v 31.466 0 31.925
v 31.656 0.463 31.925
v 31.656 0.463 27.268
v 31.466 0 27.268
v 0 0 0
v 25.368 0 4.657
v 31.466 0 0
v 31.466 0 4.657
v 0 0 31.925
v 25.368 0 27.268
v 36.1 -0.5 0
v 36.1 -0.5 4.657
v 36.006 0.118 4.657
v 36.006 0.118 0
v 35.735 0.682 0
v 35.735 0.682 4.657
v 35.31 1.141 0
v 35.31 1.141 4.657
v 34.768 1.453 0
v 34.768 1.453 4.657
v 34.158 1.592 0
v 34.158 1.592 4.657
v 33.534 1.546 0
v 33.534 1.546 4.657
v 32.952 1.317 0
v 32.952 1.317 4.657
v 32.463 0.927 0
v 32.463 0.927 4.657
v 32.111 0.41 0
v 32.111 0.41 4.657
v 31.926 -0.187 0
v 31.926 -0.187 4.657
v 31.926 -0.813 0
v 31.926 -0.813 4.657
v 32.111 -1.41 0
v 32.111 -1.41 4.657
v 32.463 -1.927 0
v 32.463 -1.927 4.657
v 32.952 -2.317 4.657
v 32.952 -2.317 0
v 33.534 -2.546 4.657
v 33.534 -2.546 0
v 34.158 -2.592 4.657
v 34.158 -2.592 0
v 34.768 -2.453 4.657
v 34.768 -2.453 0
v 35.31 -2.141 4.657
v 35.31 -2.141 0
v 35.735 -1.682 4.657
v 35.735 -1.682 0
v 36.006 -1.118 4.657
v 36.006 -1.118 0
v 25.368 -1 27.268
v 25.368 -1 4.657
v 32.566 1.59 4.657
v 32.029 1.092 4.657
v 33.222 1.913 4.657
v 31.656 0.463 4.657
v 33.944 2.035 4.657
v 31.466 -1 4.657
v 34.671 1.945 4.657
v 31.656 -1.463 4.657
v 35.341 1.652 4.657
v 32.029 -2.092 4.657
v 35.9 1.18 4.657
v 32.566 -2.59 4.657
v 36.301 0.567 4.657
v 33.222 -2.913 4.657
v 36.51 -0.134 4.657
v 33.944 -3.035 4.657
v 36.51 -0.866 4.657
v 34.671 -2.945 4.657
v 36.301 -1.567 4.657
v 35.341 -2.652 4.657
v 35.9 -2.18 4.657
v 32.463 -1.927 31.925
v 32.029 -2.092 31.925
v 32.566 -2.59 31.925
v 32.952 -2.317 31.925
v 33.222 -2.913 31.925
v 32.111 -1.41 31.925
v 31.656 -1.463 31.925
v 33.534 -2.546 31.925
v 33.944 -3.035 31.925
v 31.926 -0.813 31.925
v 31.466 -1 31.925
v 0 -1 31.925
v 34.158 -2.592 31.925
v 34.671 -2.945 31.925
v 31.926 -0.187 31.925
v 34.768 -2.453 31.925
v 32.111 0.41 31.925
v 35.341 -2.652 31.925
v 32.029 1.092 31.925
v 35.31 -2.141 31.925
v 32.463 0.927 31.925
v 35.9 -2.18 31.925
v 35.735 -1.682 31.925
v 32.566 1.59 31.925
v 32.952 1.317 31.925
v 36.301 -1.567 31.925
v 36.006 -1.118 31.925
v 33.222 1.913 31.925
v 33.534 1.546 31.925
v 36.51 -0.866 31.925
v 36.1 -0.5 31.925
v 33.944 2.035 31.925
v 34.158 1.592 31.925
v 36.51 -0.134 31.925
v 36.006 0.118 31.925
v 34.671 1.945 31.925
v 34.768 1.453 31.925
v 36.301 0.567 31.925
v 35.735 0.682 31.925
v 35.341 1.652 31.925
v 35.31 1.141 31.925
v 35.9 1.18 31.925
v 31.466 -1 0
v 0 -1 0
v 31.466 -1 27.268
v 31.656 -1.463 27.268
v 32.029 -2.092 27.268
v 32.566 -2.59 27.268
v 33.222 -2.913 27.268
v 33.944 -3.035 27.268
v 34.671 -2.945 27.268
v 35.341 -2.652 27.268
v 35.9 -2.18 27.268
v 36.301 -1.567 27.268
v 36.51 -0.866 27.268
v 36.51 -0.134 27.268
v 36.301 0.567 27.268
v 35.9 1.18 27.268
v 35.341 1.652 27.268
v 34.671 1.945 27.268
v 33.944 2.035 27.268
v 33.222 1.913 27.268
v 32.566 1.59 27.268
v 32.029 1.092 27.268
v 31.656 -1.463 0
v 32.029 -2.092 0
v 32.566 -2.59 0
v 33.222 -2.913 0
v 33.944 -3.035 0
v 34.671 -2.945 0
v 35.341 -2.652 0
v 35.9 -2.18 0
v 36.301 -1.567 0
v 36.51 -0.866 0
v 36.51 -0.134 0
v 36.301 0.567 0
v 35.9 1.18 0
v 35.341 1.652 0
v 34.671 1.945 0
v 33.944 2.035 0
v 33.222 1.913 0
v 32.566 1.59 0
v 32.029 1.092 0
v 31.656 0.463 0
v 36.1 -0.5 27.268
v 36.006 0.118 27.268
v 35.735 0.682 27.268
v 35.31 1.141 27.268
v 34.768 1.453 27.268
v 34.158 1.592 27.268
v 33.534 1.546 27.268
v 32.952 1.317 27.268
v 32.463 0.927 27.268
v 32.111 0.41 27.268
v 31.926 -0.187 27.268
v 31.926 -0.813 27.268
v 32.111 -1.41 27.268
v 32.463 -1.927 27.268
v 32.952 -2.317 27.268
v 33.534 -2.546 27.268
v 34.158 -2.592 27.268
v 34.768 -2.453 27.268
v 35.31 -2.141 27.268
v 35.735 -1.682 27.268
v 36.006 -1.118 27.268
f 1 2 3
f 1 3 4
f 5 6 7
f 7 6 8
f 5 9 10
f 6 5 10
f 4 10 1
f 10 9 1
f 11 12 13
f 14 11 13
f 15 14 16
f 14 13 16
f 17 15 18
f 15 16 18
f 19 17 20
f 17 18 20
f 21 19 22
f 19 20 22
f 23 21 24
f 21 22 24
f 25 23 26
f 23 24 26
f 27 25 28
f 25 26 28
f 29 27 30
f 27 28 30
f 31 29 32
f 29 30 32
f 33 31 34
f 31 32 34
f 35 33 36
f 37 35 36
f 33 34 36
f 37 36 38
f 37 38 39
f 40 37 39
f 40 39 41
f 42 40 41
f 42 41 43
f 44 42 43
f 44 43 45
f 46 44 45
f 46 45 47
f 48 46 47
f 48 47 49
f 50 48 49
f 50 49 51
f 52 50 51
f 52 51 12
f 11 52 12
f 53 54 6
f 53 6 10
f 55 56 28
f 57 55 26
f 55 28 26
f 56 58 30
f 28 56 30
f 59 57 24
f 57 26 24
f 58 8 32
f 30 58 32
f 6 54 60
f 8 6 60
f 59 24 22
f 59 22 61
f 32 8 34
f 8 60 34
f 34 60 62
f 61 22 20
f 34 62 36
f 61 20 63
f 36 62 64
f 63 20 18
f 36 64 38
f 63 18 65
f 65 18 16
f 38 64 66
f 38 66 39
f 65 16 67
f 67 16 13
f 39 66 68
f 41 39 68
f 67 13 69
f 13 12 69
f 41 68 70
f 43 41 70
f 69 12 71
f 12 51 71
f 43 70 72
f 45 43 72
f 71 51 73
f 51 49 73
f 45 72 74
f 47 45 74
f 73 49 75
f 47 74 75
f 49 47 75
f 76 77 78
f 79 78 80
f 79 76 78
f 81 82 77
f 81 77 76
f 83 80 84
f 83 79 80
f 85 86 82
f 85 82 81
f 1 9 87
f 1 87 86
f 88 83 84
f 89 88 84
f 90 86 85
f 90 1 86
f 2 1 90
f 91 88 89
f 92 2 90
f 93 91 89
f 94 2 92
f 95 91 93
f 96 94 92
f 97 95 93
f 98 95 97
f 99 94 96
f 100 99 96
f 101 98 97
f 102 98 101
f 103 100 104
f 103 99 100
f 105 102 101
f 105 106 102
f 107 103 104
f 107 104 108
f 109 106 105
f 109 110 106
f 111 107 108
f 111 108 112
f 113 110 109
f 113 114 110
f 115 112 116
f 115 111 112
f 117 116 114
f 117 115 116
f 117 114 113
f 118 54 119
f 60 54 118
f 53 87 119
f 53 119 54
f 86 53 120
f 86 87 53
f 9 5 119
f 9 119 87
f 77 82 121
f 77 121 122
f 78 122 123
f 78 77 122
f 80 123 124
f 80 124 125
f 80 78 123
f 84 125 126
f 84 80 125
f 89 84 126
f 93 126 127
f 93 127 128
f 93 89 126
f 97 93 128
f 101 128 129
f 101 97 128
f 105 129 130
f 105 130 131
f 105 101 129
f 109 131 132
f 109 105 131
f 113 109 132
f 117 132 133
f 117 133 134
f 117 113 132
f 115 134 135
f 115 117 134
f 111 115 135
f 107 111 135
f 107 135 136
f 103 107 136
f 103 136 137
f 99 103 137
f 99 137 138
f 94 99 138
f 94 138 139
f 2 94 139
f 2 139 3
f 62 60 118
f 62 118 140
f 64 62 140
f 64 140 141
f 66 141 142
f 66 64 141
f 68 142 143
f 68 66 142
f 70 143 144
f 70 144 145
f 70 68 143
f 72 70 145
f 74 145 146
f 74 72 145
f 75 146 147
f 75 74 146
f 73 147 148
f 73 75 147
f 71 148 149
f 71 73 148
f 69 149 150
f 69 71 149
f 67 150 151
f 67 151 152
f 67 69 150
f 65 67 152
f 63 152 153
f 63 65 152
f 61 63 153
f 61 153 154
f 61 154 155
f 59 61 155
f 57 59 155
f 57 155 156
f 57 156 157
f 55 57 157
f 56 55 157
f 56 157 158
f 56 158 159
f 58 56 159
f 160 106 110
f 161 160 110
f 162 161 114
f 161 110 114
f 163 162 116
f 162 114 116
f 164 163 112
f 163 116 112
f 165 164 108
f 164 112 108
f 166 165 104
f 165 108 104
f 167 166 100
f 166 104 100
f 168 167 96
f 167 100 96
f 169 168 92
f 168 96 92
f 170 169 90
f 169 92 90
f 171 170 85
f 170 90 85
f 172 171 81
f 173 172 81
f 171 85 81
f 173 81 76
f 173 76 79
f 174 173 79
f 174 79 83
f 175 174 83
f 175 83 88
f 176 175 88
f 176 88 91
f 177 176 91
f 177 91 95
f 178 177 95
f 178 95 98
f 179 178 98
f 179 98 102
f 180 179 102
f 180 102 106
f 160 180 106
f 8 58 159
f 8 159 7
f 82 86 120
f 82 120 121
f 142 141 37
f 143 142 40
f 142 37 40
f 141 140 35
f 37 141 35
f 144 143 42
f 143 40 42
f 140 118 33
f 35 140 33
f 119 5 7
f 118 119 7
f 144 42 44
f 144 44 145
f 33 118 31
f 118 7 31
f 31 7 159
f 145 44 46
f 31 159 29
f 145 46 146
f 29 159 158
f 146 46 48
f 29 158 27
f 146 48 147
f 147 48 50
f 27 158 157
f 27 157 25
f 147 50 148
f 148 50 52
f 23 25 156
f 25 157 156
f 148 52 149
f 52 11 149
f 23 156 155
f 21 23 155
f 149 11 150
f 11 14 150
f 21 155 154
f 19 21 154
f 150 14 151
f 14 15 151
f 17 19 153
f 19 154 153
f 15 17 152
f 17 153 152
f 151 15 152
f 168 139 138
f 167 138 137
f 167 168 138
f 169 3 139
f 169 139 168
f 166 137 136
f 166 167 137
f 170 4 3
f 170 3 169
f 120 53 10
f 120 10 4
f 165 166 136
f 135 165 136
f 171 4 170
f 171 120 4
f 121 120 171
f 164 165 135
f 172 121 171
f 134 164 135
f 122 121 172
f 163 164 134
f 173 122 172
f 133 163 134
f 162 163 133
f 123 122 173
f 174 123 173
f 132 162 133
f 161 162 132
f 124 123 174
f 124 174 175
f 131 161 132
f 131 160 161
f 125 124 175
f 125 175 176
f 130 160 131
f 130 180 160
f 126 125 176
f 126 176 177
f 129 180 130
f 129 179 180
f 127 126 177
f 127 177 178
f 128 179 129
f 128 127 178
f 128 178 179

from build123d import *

# Parameters (mm, degrees)
F0_W     = 31.46597
F0_H     = 31.925406
F1_DEPTH = 1
F2_R     = 2.098305
F3_DEPTH = 31.925406
F4_W     = 12.19663
F4_H     = 22.610463
F5_DEPTH = 3.81


with BuildPart() as f1:
    # F0 (on Front) → F1 (new body)
    with BuildSketch(Plane.XZ):
        with Locations((15.732985, 15.962703)):
            Rectangle(F0_W, F0_H)
    extrude(amount=F1_DEPTH)

    # F2 (on face) → F3 (join, through all)
    with BuildSketch(Plane.XY.offset(31.925406)):
        with BuildLine():
            Line((31.46597, -1), (31.655797, -1.462564))
            ThreePointArc((31.655797, -1.462564), (36.536716, -0.5), (31.655797, 0.462564))
            Line((31.655797, 0.462564), (31.46597, 0))
            Line((31.46597, 0), (31.46597, -1))
        make_face()
        with Locations((34.001343, -0.5)):
            Circle(F2_R, mode=Mode.SUBTRACT)
    extrude(amount=-F3_DEPTH)

    # F4 (on face) → F5 (cut, symmetric)
    with BuildSketch(Plane.XZ.offset(1)):
        with Locations((31.46597, 15.962703)):
            Rectangle(F4_W, F4_H)
    extrude(amount=F5_DEPTH, both=True, mode=Mode.SUBTRACT)


solid = f1.part
